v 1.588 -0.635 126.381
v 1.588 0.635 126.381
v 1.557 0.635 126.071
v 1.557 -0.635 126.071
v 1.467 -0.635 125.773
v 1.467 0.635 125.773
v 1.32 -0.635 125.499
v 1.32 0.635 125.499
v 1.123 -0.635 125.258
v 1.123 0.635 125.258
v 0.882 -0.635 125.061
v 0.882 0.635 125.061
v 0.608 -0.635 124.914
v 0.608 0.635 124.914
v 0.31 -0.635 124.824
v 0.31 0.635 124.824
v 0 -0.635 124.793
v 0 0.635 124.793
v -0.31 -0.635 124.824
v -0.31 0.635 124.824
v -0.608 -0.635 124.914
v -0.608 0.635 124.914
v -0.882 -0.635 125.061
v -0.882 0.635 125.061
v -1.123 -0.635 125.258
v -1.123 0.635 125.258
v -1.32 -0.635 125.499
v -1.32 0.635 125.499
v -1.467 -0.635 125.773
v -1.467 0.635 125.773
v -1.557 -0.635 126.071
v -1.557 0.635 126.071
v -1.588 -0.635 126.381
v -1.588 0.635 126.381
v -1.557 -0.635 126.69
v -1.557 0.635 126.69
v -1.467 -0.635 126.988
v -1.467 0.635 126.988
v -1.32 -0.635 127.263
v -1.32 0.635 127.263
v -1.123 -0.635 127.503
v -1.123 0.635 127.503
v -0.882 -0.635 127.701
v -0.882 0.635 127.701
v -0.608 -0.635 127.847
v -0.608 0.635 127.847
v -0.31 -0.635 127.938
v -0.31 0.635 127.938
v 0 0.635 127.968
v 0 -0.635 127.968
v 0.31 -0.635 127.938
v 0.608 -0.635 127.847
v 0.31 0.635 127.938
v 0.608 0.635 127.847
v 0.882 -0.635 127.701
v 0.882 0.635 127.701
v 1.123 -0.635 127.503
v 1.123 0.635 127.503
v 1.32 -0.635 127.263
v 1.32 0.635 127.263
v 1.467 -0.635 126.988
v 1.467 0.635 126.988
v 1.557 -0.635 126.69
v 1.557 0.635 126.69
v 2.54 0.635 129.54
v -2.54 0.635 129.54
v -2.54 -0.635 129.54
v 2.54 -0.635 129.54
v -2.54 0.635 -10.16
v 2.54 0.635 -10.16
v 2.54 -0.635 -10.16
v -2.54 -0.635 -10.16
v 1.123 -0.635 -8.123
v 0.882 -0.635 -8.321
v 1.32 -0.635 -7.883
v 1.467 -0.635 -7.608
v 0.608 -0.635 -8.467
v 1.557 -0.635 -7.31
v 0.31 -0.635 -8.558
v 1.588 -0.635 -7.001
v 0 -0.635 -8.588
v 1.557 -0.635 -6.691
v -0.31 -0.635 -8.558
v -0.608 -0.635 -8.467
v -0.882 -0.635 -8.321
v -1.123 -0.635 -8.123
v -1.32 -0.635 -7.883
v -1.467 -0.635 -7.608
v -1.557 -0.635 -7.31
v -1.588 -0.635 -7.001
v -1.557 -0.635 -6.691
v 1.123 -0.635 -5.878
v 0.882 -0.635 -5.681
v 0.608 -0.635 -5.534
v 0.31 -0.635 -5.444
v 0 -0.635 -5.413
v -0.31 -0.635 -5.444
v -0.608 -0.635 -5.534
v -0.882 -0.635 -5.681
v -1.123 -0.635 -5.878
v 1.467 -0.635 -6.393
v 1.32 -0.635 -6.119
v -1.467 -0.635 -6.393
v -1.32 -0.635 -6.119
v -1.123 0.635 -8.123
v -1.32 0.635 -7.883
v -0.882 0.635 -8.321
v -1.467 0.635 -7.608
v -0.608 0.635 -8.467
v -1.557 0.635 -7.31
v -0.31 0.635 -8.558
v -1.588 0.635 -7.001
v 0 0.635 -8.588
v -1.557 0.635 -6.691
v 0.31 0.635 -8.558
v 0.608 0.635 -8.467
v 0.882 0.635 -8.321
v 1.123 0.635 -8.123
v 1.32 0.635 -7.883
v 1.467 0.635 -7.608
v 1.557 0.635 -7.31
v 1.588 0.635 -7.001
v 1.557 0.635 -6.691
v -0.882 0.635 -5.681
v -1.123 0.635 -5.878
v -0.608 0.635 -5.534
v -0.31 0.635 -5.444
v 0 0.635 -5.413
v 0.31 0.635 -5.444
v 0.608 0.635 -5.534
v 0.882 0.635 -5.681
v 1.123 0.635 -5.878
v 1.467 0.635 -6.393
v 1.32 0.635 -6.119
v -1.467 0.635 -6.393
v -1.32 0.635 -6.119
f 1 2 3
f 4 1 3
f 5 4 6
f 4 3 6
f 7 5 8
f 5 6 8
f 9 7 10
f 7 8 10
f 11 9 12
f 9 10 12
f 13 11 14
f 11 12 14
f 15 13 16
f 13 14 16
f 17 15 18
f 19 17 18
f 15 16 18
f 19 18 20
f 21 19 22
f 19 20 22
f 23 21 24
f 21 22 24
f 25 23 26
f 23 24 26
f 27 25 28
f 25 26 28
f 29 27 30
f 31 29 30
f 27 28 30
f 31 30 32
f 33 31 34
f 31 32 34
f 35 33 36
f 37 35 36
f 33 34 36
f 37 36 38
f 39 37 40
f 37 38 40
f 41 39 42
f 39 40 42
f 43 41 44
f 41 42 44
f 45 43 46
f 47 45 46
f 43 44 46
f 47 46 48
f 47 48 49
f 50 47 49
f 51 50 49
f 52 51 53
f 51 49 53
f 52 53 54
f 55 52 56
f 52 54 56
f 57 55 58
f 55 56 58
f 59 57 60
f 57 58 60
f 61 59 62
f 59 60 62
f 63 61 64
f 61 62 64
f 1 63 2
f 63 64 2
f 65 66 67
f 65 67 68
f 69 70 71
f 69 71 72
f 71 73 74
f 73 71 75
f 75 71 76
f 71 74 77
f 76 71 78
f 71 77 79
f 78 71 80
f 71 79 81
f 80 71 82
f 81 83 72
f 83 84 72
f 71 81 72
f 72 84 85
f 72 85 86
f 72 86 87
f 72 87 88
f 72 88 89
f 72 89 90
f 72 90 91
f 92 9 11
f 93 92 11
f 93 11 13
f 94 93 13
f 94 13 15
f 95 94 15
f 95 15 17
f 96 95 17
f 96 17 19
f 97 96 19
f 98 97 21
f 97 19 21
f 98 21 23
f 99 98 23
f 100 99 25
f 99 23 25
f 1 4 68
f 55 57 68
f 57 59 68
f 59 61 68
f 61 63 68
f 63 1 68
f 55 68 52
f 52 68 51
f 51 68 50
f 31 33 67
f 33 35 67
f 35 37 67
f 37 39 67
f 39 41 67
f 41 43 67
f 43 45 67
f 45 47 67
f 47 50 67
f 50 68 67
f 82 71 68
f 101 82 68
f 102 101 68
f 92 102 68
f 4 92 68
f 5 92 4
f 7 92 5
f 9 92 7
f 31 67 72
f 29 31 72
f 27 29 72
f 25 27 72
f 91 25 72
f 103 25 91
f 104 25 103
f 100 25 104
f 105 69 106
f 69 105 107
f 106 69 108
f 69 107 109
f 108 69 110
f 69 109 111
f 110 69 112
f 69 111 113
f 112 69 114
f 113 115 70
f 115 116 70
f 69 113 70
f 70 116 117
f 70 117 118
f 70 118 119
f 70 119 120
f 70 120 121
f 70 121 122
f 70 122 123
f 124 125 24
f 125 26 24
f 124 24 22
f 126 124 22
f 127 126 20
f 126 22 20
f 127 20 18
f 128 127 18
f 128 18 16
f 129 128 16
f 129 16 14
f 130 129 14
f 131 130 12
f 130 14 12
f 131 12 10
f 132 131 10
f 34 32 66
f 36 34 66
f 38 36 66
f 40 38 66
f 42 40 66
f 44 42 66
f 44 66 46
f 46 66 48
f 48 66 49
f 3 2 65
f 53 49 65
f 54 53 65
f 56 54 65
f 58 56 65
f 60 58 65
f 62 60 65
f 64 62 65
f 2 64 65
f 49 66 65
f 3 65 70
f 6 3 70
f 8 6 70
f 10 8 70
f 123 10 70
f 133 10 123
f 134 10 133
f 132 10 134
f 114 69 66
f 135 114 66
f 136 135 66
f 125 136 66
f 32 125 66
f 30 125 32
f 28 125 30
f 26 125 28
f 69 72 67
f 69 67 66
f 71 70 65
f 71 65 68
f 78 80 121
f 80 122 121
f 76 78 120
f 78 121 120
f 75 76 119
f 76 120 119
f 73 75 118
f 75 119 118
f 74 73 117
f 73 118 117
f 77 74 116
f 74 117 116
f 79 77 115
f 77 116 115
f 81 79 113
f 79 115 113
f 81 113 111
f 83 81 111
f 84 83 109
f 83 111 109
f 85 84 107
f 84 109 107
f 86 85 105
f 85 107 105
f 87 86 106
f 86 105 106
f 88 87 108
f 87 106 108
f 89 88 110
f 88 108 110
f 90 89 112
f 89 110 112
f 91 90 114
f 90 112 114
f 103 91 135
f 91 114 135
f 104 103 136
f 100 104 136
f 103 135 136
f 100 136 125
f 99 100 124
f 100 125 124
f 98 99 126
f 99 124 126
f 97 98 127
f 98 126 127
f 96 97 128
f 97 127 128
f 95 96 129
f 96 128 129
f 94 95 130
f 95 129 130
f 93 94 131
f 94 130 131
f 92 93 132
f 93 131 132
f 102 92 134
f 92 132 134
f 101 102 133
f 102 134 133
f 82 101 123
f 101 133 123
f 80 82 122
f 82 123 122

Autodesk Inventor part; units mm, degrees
ref_plane "YZ Plane" through (0, 0, 0) normal (1, 0, 0) x (0, 1, 0)
ref_plane "XZ Plane" through (0, 0, 0) normal (0, 1, 0) x (-1, 0, 0)
sketch "Sketch1" plane through (0, 0, 0) normal (0, 0, 1) x (1, 0, 0)
  line L0 (2.54, -0.635) -> (-2.54, -0.635)
  line L1 (-2.54, -0.635) -> (-2.54, 0.635)
  line L2 (-2.54, 0.635) -> (2.54, 0.635)
  line L3 (2.54, 0.635) -> (2.54, -0.635)
  line L4 (2.54, -0.635) -> (-2.54, 0.635) construction
  line L5 (-2.54, -0.635) -> (2.54, 0.635) construction
  point P0 (0, 0)
  dimension "d0" = 5.08
  dimension "d1" = 1.27
extrude "Extrusion1" add sketch "Sketch1" along normal blind 119.38
ref_plane "Work Plane1" through (0, 0, 59.69) normal (0, 0, 1) x (1, 0, 0)
sketch "Sketch2" plane through (0, 0, 119.38) normal (0, 0, 1) x (1, 0, 0)
  line L0 (2.54, 0.635) -> (-2.54, 0.635) projected
  line L1 (-2.54, 0.635) -> (-2.54, -0.635) projected
  line L2 (-2.54, -0.635) -> (2.54, -0.635) projected
  line L3 (2.54, -0.635) -> (2.54, 0.635) projected
  point P0 (0, 0)
extrude "Extrusion2" add sketch "Sketch2" along normal blind 10.16
sketch "Sketch3" plane through (-2.54, 0.635, 0) normal (0, 1, 0) x (1, 0, 0)
  line L0 (5.08, -119.38) -> (0, -119.38) construction
  line L1 (2.54, -119.38) -> (2.54, -129.54) construction
  line L2 (0, -129.54) -> (5.08, -129.54) construction
  circle A0 centre (2.54, -126.3807) radius 1.5875
  point P0 (2.54, 0)
extrude "Extrusion3" cut sketch "Sketch3" against normal blind 6.35
mirror "Mirror1" about plane through (0, 0, 59.69) normal (0, 0, 1) of "Extrusion2"
mirror "Mirror2" about plane through (0, 0, 59.69) normal (0, 0, 1) of "Extrusion3"
thread "Thread1" size "5-40 UNC" class "2B" standard "ANSI Unified Screw Threads" full length
thread "Thread2" size "5-40 UNC" class "2B" standard "ANSI Unified Screw Threads" full length
properties part number "Pedal Bar"
